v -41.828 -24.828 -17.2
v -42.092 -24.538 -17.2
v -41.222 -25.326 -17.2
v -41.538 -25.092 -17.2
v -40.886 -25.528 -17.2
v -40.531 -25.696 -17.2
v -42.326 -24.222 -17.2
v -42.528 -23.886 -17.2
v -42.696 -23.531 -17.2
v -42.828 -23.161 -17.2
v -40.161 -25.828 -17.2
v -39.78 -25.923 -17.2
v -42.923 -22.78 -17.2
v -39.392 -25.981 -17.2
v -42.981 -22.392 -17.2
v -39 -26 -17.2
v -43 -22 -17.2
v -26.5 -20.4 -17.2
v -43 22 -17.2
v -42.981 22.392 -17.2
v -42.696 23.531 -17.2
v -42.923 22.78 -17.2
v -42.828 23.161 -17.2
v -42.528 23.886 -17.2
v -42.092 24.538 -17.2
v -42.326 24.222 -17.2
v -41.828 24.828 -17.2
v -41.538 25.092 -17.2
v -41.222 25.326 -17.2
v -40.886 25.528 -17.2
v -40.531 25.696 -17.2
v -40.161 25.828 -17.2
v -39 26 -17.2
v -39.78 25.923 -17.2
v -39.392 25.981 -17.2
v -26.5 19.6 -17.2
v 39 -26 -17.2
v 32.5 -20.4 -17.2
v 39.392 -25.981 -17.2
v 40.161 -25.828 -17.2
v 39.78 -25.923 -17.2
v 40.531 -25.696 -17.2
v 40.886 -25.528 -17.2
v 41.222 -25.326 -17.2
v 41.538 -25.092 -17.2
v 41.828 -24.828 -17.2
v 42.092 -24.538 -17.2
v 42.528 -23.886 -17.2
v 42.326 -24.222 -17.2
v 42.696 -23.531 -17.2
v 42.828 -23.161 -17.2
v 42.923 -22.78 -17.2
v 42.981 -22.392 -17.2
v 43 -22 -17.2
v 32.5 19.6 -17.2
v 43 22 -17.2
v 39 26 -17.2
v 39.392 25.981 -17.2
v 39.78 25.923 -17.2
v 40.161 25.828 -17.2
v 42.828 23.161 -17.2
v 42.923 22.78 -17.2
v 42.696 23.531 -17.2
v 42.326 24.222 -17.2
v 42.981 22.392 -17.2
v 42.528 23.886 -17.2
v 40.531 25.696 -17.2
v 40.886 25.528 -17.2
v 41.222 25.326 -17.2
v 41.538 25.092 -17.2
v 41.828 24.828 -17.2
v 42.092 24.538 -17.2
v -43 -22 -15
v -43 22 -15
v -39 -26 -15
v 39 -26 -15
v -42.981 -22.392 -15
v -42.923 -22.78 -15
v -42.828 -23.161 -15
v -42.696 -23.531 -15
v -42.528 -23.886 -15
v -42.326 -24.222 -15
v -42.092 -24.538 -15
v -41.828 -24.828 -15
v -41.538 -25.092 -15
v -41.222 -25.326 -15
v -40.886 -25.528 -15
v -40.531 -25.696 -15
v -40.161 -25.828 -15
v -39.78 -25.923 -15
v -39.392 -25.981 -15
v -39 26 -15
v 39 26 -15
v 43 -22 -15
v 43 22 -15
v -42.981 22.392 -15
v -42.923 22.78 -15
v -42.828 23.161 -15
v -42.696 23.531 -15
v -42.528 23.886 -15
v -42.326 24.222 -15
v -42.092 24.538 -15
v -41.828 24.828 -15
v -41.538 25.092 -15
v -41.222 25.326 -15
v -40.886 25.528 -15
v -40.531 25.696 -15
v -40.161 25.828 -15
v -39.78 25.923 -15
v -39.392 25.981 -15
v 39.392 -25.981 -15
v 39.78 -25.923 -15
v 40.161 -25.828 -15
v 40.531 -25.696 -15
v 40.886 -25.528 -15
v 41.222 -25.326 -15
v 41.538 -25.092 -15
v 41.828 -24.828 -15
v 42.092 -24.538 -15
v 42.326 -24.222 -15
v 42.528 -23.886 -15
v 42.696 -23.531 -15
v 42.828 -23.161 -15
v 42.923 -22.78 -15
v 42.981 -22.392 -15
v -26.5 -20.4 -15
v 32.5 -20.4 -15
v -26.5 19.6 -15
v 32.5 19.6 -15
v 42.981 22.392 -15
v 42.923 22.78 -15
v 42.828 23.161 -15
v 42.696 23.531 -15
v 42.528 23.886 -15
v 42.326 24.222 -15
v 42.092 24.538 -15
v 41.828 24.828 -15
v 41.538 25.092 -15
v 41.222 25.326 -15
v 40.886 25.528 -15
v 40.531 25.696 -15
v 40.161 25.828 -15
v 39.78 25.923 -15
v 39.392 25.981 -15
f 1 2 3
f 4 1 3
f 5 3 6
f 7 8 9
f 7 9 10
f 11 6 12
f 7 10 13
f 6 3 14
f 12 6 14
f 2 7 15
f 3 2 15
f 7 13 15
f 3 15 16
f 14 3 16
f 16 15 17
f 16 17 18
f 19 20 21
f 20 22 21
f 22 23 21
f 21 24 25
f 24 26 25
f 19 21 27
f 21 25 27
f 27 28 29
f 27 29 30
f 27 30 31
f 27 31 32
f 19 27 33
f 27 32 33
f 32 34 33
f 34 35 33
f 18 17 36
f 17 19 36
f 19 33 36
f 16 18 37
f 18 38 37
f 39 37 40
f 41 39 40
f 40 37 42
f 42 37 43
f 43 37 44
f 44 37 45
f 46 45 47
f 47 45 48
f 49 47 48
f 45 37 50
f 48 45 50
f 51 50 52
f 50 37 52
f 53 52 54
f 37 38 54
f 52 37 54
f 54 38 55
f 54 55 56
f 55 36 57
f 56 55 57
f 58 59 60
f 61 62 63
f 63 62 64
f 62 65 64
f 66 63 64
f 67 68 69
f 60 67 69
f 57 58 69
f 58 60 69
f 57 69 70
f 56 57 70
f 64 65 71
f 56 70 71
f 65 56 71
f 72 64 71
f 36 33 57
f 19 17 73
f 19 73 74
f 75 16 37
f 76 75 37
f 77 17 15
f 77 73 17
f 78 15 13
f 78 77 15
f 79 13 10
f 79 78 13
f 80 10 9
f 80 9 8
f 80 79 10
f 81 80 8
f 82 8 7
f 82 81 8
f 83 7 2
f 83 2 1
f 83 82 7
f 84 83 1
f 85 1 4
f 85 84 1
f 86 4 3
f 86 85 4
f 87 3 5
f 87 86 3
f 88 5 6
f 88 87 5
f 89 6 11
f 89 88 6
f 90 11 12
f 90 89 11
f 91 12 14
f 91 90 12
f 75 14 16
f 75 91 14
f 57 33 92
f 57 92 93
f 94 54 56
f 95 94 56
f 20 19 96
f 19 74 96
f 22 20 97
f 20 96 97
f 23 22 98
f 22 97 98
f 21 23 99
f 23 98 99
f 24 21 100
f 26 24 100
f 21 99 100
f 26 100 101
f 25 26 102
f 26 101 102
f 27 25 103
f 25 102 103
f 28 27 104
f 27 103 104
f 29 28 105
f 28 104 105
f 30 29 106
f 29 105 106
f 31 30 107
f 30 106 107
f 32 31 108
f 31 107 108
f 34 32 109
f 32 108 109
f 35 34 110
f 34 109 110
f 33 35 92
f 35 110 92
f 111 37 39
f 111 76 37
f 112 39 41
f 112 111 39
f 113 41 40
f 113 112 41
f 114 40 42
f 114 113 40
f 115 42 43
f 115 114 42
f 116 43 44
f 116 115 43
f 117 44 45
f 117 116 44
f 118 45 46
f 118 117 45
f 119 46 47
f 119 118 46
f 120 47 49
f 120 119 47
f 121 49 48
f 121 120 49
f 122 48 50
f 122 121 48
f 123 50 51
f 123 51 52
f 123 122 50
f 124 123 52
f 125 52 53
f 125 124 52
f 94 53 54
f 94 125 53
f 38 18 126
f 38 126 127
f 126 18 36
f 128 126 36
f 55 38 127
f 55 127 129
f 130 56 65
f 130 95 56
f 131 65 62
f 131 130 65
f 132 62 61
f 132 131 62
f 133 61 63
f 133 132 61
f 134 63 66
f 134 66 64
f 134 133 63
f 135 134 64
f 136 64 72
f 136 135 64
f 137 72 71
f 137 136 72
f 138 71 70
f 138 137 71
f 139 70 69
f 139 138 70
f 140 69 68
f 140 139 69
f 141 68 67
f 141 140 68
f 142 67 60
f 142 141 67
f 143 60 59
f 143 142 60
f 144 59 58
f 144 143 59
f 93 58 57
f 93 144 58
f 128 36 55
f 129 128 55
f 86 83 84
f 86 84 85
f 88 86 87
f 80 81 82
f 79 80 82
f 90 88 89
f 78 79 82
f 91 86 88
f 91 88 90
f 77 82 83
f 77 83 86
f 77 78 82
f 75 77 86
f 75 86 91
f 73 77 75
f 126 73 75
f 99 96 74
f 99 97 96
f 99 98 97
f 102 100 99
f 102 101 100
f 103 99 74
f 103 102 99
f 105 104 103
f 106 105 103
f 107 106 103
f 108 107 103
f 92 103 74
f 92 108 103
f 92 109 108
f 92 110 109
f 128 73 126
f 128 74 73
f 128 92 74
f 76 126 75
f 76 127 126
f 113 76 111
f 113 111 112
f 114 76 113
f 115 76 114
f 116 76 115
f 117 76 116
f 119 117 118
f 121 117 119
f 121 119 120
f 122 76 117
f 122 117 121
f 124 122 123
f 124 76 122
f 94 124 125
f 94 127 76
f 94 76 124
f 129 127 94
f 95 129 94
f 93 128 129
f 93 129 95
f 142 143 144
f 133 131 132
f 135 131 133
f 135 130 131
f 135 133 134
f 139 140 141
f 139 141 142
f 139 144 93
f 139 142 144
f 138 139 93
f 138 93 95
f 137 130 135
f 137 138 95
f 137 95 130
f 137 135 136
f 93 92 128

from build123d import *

# Parameters (mm, degrees)
BOX024_W     = 59
BOX024_H     = 40
BOX024_DEPTH = 4
BOX002_W     = 86
BOX002_H     = 52
BOX002_DEPTH = 2.2
FILLET_R     = 4


with BuildPart() as display_cut:
    # Box024 → Box024 (new body)
    with BuildSketch(Plane(origin=(-26.5, -20.4, -18), x_dir=(1, 0, 0), z_dir=(0, 0, 1))):
        with Locations((29.5, 20)):
            Rectangle(BOX024_W, BOX024_H)
    extrude(amount=BOX024_DEPTH)


with BuildPart() as main_lid:
    # Box002 → Box002 (new body)
    with BuildSketch(Plane(origin=(-43, -26, -17.2), x_dir=(1, 0, 0), z_dir=(0, 0, 1))):
        with Locations((43, 26)):
            Rectangle(BOX002_W, BOX002_H)
    extrude(amount=BOX002_DEPTH)

    # Fillet
    fillet_edges = [main_lid.edges().sort_by_distance(p)[0] for p in [
        (-43, -26, -16.1),
        (-43, 26, -16.1),
        (43, -26, -16.1),
        (43, 26, -16.1),
    ]]
    fillet(fillet_edges, radius=FILLET_R)

    # Cut004: cut Display Cut
    add(display_cut.part, mode=Mode.SUBTRACT)


solid = main_lid.part
